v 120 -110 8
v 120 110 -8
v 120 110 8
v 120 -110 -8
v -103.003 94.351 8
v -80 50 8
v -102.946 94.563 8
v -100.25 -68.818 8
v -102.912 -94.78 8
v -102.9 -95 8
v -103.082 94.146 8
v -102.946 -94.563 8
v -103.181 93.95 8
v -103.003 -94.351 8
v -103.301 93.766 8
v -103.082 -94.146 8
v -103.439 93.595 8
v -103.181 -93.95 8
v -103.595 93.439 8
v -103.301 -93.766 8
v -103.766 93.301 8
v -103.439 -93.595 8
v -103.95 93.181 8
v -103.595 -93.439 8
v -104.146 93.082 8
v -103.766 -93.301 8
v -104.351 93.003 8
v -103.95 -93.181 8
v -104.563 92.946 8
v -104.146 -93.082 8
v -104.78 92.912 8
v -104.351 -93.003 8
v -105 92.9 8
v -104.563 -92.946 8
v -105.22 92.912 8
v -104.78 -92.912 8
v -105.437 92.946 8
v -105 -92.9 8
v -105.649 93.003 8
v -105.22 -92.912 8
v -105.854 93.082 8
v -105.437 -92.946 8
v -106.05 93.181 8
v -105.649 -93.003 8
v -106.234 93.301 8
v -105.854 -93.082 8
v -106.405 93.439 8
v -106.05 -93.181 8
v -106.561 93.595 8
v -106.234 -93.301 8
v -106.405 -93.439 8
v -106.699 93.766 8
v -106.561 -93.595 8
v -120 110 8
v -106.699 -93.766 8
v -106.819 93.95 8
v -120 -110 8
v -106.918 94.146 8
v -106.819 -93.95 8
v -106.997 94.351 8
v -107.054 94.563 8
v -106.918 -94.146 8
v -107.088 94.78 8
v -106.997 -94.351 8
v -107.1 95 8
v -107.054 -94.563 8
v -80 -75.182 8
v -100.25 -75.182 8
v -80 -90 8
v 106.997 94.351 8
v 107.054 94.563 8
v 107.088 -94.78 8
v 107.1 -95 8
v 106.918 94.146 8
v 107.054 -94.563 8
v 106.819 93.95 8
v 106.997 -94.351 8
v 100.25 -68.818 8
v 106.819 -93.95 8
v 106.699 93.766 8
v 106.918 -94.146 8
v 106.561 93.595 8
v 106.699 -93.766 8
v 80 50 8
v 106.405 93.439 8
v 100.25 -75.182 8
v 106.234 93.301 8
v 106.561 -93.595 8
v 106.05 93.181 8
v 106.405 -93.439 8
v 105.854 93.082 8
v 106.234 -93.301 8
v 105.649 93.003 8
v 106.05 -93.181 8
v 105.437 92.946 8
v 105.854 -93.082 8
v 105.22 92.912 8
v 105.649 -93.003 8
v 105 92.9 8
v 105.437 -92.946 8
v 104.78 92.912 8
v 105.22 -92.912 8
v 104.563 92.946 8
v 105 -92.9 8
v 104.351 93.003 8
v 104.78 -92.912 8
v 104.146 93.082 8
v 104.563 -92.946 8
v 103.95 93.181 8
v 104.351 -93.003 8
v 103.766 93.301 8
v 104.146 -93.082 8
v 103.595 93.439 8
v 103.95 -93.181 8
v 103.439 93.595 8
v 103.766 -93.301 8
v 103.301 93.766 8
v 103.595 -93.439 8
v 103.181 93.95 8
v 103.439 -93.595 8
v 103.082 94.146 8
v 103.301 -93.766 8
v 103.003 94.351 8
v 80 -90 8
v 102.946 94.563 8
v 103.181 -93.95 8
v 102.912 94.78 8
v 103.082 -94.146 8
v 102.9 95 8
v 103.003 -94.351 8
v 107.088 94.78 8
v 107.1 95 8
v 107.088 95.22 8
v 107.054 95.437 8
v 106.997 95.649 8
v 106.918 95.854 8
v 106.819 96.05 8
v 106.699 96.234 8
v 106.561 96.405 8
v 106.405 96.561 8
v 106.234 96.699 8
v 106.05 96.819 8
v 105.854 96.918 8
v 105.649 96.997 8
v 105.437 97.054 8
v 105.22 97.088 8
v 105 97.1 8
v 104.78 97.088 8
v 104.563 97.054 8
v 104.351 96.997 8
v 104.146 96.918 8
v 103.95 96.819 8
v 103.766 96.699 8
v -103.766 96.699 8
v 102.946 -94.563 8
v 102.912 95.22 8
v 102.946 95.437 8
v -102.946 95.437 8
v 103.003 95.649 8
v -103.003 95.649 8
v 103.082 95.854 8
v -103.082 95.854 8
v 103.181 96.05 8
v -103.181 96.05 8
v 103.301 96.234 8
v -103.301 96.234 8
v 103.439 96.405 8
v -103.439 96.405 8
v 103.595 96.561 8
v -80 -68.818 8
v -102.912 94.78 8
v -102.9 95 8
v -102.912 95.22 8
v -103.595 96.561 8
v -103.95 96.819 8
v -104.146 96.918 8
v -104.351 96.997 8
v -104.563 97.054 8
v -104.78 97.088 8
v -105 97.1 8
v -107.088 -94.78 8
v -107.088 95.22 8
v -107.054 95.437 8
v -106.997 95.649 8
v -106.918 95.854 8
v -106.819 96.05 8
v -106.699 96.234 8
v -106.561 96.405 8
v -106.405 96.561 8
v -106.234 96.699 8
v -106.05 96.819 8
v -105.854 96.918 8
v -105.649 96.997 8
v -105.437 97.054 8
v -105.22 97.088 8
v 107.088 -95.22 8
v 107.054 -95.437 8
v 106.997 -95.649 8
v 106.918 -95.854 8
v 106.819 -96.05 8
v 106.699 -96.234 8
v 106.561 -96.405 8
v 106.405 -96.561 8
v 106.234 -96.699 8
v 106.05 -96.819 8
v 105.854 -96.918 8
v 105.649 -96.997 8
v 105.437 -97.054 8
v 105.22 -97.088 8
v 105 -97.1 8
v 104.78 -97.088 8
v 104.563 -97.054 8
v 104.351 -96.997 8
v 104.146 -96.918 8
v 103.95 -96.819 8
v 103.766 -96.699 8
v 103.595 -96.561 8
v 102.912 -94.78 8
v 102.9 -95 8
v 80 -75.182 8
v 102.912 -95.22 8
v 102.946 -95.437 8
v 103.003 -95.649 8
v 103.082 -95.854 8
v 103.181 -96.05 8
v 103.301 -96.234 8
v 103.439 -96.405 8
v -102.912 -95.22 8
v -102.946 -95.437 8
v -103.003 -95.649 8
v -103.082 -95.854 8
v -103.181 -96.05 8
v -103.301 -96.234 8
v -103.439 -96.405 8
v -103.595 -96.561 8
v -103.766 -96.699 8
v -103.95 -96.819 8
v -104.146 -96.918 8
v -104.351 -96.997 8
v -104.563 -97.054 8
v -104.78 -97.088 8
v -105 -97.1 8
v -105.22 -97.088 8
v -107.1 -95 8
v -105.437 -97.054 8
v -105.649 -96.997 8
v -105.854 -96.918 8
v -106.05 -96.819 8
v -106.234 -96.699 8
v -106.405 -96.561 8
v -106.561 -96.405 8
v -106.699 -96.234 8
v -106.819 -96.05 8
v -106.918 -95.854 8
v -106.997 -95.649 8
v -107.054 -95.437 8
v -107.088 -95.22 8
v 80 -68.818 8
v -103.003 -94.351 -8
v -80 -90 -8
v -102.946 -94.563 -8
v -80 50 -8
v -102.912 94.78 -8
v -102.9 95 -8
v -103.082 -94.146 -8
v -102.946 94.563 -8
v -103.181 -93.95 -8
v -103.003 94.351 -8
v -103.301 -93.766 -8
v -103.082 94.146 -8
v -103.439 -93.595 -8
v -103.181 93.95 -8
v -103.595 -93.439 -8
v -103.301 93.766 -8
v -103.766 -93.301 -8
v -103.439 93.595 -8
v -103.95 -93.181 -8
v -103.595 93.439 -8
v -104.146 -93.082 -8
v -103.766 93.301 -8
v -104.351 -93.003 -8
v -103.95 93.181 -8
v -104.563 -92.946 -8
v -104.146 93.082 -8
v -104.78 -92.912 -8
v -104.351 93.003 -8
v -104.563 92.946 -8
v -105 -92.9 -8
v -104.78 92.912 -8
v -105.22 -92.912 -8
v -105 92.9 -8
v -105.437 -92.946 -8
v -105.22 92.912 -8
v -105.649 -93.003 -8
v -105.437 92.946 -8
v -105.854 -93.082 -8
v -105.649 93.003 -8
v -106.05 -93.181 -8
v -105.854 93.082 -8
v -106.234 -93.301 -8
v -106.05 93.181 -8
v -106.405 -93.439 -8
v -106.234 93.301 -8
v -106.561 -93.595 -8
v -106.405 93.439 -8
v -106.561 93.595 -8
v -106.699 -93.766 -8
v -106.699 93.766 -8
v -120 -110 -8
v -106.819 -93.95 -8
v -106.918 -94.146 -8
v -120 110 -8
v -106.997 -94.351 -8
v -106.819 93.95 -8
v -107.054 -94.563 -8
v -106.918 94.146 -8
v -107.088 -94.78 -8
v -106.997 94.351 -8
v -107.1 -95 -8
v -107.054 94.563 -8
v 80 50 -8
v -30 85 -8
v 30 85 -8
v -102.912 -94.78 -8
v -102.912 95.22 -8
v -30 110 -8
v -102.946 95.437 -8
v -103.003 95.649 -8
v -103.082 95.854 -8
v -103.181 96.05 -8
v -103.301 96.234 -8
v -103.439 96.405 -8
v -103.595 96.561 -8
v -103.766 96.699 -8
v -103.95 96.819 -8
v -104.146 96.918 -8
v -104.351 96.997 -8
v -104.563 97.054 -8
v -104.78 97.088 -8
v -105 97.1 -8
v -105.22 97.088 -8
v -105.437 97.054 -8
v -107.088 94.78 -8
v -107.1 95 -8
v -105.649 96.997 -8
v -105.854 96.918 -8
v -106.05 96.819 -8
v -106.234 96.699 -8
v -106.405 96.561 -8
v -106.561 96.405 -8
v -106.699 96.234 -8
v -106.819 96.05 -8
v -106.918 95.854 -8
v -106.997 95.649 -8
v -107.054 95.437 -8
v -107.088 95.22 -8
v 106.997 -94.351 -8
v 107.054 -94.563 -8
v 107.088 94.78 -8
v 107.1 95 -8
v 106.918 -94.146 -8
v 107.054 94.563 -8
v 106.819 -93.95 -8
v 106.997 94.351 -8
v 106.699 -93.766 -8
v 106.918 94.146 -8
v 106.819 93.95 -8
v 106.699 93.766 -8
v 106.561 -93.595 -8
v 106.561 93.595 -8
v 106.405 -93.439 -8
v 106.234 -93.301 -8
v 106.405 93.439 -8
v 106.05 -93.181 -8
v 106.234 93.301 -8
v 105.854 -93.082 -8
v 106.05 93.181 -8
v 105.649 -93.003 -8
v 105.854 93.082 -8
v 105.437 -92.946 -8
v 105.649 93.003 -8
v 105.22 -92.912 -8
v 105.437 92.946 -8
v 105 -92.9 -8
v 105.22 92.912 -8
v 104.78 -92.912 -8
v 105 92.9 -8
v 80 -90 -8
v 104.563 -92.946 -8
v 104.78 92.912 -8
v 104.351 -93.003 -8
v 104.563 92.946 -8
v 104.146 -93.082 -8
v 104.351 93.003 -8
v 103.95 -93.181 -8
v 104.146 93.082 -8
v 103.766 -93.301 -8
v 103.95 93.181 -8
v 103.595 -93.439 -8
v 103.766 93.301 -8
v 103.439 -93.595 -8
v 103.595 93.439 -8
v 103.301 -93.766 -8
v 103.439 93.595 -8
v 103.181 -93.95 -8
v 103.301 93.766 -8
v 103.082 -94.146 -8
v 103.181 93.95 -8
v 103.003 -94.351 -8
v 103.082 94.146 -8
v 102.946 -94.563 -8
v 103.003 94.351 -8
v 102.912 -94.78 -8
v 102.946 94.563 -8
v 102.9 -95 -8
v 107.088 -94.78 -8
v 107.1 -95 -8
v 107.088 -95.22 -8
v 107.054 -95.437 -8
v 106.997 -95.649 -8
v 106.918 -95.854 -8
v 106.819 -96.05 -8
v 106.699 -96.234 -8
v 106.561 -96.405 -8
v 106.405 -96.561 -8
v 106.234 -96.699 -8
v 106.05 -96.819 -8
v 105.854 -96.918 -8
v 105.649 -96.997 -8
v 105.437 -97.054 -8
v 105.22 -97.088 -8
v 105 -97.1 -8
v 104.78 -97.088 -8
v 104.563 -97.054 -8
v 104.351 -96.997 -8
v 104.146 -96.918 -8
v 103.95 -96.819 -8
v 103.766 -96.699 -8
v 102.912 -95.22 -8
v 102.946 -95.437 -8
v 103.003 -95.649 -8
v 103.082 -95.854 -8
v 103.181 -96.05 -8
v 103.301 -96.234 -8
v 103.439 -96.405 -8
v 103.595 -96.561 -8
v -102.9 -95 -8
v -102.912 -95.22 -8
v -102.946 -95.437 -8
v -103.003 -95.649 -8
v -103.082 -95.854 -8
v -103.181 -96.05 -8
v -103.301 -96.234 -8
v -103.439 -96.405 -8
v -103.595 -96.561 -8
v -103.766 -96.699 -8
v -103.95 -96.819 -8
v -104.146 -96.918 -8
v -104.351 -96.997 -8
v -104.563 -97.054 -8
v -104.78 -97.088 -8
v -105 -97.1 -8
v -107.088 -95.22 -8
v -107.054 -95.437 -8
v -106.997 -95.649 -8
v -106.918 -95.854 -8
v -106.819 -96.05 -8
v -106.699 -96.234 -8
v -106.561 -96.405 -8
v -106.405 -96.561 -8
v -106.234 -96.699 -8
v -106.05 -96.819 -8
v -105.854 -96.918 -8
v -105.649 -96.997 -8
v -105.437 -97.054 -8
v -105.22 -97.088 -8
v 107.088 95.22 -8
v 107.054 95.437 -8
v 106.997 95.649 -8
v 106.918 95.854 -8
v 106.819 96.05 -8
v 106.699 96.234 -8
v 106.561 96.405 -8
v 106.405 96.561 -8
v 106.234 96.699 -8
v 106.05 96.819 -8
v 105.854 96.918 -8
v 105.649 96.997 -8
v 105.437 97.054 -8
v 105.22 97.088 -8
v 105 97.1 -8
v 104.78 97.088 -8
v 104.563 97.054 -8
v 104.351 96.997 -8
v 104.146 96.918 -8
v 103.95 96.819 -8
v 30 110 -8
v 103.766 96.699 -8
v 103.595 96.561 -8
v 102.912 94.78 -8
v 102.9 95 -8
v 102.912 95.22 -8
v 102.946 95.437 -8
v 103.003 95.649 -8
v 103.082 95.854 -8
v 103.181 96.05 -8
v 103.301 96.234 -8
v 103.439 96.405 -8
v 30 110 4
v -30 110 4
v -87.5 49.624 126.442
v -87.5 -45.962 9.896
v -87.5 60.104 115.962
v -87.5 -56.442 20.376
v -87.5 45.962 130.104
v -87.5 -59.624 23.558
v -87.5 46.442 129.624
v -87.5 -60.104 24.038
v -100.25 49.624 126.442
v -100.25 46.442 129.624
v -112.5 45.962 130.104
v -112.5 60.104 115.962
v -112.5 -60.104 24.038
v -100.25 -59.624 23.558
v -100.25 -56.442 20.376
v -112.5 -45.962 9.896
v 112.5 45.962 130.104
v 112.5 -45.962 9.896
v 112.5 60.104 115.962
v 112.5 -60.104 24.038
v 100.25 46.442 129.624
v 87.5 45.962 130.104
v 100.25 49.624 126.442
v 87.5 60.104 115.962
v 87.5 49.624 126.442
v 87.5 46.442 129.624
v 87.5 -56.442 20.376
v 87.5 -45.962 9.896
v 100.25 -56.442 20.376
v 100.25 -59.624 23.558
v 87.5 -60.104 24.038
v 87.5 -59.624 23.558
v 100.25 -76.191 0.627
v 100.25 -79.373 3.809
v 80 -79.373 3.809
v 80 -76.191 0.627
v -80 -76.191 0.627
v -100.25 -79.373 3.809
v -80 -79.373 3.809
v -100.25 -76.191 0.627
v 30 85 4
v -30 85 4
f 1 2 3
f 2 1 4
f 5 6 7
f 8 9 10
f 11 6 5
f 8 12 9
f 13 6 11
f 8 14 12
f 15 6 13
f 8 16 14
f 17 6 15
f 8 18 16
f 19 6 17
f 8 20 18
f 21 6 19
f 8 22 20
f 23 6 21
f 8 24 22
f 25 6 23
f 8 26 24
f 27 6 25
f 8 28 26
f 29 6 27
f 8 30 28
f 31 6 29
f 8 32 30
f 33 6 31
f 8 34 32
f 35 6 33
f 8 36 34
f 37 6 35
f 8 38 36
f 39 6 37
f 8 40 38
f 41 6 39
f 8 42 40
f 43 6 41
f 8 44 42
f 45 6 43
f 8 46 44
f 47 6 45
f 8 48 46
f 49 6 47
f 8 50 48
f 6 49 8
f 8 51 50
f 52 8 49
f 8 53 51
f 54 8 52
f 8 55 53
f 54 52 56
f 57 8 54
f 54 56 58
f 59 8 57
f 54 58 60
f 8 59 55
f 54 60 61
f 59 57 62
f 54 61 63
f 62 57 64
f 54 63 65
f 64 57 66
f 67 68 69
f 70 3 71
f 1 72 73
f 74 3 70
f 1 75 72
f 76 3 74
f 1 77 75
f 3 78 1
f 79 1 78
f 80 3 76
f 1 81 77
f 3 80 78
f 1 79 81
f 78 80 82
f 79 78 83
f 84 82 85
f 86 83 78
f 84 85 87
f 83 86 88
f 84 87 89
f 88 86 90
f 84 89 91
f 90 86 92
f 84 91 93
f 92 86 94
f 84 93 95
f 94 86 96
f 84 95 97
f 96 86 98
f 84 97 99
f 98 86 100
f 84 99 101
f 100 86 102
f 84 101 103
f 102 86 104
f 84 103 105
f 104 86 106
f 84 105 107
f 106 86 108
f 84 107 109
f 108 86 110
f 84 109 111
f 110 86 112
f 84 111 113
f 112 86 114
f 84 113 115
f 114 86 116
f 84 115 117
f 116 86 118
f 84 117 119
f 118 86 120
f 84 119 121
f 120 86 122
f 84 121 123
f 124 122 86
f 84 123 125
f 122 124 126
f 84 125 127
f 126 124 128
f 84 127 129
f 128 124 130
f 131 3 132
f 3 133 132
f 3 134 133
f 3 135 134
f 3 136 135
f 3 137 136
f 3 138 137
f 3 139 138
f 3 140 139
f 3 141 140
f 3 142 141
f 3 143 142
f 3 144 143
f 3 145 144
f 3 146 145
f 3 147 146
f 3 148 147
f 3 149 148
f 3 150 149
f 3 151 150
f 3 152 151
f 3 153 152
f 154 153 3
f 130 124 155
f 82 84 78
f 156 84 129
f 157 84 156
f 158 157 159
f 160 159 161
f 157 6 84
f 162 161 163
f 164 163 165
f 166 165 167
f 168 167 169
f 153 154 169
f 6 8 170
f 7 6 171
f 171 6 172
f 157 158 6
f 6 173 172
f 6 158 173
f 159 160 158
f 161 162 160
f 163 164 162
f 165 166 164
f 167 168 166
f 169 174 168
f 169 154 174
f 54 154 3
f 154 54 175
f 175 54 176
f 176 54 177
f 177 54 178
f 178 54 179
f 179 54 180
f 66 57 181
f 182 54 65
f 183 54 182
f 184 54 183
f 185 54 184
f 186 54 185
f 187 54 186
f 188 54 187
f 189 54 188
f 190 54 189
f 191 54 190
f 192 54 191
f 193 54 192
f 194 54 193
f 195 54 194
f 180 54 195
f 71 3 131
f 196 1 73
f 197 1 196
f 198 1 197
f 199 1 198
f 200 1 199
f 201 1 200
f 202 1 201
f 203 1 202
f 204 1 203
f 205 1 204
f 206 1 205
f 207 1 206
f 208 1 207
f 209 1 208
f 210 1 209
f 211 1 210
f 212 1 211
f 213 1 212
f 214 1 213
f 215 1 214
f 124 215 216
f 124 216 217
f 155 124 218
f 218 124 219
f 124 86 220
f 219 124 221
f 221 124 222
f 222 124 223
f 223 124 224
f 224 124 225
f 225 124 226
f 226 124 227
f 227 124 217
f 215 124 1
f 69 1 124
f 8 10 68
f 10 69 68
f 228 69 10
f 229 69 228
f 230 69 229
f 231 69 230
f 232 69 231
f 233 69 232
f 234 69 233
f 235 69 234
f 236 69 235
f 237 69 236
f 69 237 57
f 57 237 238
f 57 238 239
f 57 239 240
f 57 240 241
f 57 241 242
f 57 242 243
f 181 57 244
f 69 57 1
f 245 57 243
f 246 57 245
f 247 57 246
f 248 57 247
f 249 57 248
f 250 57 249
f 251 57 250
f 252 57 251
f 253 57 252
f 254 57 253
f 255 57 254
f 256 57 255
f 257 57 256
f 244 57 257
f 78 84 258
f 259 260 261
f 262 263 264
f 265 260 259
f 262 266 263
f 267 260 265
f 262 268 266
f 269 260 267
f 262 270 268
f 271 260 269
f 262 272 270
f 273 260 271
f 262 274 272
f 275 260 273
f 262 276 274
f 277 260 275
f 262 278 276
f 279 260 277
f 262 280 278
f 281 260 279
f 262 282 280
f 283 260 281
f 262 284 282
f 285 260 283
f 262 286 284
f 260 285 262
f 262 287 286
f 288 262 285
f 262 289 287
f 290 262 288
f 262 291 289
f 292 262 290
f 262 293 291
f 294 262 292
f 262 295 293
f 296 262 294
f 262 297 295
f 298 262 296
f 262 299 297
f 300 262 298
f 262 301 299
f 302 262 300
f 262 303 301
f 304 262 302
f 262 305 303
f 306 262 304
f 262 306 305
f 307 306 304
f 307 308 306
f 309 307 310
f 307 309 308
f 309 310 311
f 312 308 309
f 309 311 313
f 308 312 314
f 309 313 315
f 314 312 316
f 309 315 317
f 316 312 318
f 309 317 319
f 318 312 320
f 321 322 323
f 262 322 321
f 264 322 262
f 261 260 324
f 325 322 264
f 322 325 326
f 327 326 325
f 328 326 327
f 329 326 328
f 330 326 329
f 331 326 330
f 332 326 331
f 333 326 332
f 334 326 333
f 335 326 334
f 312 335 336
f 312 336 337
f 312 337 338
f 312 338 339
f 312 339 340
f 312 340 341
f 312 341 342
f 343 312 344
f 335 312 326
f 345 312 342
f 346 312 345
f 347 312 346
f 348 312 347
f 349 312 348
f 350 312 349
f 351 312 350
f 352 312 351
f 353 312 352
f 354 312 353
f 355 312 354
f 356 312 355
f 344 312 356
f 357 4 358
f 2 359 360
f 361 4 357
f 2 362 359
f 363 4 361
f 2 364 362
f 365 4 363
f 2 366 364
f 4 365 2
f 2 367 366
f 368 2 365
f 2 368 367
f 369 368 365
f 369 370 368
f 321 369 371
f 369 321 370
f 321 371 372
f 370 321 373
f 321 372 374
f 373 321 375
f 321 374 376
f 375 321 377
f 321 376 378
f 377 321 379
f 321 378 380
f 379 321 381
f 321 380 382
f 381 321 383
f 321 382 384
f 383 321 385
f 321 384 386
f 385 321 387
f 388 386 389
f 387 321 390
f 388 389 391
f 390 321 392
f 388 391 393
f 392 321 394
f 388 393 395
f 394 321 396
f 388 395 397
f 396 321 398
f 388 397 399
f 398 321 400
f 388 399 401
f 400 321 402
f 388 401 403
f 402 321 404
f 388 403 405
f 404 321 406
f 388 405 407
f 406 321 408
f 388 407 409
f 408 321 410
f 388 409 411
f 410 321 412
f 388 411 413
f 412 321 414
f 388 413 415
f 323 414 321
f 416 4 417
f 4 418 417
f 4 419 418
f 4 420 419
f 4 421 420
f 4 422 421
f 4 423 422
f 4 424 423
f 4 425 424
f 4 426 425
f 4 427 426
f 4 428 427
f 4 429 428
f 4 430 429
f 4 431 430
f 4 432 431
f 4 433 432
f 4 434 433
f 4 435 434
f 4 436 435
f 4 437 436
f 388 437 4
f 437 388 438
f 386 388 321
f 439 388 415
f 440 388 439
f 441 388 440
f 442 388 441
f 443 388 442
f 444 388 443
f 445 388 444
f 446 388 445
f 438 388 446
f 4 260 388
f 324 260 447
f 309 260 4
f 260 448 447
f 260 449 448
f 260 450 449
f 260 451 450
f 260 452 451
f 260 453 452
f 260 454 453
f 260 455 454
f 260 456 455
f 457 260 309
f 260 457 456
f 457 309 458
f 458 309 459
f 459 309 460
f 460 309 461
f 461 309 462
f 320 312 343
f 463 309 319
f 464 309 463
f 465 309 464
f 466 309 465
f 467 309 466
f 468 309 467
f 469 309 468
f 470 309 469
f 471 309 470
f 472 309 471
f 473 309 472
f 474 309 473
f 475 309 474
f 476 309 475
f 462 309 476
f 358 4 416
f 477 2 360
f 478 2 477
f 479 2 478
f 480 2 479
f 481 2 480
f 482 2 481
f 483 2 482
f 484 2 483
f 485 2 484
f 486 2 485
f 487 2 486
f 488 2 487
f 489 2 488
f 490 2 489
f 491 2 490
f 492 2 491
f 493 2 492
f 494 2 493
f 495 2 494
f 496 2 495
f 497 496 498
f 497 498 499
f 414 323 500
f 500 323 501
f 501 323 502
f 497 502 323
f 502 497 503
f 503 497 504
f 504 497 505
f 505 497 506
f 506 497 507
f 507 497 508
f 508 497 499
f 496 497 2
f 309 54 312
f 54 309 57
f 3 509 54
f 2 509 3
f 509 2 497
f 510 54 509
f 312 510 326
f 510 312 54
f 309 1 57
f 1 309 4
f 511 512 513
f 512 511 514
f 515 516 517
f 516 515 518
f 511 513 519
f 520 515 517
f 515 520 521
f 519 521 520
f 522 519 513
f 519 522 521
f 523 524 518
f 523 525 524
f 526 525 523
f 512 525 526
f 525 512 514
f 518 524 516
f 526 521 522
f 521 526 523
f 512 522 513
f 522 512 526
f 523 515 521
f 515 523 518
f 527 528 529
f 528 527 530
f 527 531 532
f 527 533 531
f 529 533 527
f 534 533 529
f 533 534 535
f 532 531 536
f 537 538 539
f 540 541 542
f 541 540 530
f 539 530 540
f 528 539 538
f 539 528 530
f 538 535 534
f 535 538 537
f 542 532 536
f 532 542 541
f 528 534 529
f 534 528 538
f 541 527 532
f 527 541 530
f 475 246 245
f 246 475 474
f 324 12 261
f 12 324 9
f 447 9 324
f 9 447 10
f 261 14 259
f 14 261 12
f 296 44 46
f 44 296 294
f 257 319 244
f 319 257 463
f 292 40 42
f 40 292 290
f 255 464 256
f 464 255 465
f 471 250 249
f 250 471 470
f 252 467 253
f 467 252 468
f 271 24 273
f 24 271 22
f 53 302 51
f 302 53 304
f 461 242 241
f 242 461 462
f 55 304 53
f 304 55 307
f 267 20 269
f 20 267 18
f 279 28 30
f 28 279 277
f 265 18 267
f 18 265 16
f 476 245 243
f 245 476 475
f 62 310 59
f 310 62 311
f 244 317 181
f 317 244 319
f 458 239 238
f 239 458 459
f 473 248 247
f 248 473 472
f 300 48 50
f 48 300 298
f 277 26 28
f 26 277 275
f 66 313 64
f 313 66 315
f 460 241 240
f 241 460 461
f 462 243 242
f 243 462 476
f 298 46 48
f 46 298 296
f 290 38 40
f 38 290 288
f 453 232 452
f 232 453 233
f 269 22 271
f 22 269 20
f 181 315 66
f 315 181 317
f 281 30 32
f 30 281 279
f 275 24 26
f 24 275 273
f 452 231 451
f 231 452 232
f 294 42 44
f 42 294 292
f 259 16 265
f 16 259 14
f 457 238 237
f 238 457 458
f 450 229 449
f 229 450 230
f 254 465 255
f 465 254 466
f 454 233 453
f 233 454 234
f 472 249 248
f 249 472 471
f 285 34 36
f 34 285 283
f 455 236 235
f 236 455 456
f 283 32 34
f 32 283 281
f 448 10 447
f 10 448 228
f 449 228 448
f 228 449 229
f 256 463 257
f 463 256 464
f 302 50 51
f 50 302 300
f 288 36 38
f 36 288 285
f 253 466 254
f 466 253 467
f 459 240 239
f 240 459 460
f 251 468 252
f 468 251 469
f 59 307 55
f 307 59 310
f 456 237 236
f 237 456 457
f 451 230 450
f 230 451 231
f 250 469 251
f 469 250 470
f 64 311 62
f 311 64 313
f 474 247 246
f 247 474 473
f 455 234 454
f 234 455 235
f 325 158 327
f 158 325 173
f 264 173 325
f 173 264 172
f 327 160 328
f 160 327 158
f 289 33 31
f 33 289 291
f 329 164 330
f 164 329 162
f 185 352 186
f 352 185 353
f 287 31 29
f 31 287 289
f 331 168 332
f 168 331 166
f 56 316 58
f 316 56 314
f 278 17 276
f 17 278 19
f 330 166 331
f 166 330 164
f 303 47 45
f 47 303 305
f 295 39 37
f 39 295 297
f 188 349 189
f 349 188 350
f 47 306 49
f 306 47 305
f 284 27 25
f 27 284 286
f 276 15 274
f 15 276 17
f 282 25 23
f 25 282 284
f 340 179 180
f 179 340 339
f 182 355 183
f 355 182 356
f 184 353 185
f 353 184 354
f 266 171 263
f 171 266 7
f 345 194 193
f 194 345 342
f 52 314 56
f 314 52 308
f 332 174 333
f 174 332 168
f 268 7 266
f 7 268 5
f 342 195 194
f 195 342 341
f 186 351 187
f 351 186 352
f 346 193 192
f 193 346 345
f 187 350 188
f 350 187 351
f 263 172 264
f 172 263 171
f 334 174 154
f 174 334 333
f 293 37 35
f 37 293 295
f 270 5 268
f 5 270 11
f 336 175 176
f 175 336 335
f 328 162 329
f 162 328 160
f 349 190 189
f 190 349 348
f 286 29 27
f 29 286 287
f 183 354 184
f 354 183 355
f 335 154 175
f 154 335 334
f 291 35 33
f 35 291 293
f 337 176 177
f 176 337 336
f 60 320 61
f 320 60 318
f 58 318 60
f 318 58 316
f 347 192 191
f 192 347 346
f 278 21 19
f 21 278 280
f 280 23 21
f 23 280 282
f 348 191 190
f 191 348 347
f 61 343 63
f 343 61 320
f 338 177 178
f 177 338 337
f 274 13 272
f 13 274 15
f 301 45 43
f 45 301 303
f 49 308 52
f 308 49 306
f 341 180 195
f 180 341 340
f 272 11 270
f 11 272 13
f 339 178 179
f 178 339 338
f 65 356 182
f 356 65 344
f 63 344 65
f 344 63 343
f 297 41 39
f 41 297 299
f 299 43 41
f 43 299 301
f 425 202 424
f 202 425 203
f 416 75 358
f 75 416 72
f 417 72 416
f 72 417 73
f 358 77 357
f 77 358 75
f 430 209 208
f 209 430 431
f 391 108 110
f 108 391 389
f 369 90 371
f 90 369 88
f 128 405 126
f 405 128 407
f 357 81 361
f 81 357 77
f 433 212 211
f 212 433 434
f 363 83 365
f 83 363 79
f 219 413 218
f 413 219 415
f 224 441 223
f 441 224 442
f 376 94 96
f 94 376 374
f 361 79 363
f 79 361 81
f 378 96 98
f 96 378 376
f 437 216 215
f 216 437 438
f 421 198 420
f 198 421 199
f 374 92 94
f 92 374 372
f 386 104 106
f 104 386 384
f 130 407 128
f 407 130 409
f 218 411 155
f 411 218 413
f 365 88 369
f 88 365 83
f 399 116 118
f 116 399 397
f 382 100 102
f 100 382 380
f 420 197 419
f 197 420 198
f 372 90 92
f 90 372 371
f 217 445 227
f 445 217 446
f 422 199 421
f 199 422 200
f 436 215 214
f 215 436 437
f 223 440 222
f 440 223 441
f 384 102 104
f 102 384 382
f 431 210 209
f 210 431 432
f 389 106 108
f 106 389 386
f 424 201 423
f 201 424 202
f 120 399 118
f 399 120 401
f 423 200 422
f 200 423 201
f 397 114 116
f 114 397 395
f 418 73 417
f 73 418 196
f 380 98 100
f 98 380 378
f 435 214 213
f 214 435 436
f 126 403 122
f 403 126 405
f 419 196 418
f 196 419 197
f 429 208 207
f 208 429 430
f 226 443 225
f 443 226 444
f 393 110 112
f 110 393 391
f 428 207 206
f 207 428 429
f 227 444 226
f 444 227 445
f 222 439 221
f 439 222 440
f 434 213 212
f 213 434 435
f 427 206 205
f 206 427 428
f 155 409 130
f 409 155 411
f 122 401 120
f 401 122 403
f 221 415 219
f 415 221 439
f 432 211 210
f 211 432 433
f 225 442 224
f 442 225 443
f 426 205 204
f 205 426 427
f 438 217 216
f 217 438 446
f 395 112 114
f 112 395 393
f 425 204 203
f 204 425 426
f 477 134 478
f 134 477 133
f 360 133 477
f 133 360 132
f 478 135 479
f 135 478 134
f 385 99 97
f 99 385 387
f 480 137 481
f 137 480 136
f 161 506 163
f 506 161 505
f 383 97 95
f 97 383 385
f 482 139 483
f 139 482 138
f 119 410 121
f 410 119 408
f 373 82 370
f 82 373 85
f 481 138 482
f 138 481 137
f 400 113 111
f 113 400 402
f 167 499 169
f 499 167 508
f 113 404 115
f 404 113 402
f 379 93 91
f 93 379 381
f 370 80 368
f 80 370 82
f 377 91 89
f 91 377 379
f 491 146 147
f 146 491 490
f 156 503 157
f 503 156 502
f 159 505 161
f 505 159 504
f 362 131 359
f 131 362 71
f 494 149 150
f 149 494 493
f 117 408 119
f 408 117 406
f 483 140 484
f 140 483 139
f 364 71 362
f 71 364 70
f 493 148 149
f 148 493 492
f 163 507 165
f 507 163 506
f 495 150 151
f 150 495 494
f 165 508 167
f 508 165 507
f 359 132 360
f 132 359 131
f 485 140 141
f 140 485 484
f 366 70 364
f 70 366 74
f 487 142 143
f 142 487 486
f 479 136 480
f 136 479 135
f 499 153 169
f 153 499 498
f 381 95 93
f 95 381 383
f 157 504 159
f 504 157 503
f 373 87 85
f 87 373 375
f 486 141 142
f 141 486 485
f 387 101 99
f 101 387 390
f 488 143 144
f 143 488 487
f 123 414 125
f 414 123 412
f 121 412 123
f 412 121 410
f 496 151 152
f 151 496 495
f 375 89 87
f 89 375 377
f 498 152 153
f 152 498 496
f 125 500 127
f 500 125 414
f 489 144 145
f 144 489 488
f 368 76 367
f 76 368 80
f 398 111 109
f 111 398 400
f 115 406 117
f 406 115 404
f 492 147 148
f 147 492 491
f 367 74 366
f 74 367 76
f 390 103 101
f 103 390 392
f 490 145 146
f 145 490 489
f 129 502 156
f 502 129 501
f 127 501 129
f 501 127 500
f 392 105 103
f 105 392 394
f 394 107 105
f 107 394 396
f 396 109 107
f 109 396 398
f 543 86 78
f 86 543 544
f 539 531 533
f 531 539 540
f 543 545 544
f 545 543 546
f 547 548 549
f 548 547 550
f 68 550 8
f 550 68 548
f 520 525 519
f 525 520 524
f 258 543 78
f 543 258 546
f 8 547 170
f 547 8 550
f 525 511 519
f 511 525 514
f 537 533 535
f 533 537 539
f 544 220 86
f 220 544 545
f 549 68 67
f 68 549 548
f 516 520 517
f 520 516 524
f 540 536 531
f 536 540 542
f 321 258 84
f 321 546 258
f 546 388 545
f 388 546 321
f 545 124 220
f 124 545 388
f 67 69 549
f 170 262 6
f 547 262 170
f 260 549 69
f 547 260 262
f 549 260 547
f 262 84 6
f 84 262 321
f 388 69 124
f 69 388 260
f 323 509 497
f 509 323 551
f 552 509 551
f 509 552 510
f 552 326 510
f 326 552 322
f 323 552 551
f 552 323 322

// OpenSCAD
// =============================================================================
// KHORA // 45.0-Degree Dihedral Corner Reflector Array (DCRA) Laboratory Mount
// License: MIT
// Author: iriss-dev <contact@iriss.dev>
// =============================================================================

$fn = 60;

// Dimensions (in millimeters)
plate_width = 200.0;
plate_height = 200.0;
plate_thickness = 4.0;
slot_tolerance = 0.5;

base_width = 240.0;
base_depth = 220.0;
base_height = 16.0;

tilt_angle = 45.0; // Precise retro-reflection angle
screw_diameter = 4.2; // M4 clearance

module dcra_mounting_bracket() {
    difference() {
        // Main structural wedge block
        union() {
            // Horizontal base flange
            cube([base_width, base_depth, base_height], center = true);
            
            // Left angled upright pillar
            translate([-base_width/2 + 20, 0, 70])
                rotate([tilt_angle - 90, 0, 0])
                cube([25, 20, 150], center = true);

            // Right angled upright pillar
            translate([base_width/2 - 20, 0, 70])
                rotate([tilt_angle - 90, 0, 0])
                cube([25, 20, 150], center = true);
        }

        // 45-degree precision slot for DCRA optical plate
        translate([0, 0, 80])
            rotate([tilt_angle - 90, 0, 0])
            cube([plate_width + slot_tolerance, plate_thickness + slot_tolerance, plate_height + 20], center = true);

        // Center optical aperture (clears light cone from display beneath)
        translate([0, -20, 0])
            cube([160, 140, base_height * 2 + 1], center = true);

        // M4 bench mounting holes
        for (x = [-base_width/2 + 15, base_width/2 - 15]) {
            for (y = [-base_depth/2 + 15, base_depth/2 - 15]) {
                translate([x, y, 0])
                    cylinder(h = base_height * 3, d = screw_diameter, center = true);
            }
        }

        // Cable routing channel for lower OLED/LCD display
        translate([0, base_depth/2 - 10, -base_height/4])
            cube([60, 30, base_height], center = true);
    }
}

dcra_mounting_bracket();
